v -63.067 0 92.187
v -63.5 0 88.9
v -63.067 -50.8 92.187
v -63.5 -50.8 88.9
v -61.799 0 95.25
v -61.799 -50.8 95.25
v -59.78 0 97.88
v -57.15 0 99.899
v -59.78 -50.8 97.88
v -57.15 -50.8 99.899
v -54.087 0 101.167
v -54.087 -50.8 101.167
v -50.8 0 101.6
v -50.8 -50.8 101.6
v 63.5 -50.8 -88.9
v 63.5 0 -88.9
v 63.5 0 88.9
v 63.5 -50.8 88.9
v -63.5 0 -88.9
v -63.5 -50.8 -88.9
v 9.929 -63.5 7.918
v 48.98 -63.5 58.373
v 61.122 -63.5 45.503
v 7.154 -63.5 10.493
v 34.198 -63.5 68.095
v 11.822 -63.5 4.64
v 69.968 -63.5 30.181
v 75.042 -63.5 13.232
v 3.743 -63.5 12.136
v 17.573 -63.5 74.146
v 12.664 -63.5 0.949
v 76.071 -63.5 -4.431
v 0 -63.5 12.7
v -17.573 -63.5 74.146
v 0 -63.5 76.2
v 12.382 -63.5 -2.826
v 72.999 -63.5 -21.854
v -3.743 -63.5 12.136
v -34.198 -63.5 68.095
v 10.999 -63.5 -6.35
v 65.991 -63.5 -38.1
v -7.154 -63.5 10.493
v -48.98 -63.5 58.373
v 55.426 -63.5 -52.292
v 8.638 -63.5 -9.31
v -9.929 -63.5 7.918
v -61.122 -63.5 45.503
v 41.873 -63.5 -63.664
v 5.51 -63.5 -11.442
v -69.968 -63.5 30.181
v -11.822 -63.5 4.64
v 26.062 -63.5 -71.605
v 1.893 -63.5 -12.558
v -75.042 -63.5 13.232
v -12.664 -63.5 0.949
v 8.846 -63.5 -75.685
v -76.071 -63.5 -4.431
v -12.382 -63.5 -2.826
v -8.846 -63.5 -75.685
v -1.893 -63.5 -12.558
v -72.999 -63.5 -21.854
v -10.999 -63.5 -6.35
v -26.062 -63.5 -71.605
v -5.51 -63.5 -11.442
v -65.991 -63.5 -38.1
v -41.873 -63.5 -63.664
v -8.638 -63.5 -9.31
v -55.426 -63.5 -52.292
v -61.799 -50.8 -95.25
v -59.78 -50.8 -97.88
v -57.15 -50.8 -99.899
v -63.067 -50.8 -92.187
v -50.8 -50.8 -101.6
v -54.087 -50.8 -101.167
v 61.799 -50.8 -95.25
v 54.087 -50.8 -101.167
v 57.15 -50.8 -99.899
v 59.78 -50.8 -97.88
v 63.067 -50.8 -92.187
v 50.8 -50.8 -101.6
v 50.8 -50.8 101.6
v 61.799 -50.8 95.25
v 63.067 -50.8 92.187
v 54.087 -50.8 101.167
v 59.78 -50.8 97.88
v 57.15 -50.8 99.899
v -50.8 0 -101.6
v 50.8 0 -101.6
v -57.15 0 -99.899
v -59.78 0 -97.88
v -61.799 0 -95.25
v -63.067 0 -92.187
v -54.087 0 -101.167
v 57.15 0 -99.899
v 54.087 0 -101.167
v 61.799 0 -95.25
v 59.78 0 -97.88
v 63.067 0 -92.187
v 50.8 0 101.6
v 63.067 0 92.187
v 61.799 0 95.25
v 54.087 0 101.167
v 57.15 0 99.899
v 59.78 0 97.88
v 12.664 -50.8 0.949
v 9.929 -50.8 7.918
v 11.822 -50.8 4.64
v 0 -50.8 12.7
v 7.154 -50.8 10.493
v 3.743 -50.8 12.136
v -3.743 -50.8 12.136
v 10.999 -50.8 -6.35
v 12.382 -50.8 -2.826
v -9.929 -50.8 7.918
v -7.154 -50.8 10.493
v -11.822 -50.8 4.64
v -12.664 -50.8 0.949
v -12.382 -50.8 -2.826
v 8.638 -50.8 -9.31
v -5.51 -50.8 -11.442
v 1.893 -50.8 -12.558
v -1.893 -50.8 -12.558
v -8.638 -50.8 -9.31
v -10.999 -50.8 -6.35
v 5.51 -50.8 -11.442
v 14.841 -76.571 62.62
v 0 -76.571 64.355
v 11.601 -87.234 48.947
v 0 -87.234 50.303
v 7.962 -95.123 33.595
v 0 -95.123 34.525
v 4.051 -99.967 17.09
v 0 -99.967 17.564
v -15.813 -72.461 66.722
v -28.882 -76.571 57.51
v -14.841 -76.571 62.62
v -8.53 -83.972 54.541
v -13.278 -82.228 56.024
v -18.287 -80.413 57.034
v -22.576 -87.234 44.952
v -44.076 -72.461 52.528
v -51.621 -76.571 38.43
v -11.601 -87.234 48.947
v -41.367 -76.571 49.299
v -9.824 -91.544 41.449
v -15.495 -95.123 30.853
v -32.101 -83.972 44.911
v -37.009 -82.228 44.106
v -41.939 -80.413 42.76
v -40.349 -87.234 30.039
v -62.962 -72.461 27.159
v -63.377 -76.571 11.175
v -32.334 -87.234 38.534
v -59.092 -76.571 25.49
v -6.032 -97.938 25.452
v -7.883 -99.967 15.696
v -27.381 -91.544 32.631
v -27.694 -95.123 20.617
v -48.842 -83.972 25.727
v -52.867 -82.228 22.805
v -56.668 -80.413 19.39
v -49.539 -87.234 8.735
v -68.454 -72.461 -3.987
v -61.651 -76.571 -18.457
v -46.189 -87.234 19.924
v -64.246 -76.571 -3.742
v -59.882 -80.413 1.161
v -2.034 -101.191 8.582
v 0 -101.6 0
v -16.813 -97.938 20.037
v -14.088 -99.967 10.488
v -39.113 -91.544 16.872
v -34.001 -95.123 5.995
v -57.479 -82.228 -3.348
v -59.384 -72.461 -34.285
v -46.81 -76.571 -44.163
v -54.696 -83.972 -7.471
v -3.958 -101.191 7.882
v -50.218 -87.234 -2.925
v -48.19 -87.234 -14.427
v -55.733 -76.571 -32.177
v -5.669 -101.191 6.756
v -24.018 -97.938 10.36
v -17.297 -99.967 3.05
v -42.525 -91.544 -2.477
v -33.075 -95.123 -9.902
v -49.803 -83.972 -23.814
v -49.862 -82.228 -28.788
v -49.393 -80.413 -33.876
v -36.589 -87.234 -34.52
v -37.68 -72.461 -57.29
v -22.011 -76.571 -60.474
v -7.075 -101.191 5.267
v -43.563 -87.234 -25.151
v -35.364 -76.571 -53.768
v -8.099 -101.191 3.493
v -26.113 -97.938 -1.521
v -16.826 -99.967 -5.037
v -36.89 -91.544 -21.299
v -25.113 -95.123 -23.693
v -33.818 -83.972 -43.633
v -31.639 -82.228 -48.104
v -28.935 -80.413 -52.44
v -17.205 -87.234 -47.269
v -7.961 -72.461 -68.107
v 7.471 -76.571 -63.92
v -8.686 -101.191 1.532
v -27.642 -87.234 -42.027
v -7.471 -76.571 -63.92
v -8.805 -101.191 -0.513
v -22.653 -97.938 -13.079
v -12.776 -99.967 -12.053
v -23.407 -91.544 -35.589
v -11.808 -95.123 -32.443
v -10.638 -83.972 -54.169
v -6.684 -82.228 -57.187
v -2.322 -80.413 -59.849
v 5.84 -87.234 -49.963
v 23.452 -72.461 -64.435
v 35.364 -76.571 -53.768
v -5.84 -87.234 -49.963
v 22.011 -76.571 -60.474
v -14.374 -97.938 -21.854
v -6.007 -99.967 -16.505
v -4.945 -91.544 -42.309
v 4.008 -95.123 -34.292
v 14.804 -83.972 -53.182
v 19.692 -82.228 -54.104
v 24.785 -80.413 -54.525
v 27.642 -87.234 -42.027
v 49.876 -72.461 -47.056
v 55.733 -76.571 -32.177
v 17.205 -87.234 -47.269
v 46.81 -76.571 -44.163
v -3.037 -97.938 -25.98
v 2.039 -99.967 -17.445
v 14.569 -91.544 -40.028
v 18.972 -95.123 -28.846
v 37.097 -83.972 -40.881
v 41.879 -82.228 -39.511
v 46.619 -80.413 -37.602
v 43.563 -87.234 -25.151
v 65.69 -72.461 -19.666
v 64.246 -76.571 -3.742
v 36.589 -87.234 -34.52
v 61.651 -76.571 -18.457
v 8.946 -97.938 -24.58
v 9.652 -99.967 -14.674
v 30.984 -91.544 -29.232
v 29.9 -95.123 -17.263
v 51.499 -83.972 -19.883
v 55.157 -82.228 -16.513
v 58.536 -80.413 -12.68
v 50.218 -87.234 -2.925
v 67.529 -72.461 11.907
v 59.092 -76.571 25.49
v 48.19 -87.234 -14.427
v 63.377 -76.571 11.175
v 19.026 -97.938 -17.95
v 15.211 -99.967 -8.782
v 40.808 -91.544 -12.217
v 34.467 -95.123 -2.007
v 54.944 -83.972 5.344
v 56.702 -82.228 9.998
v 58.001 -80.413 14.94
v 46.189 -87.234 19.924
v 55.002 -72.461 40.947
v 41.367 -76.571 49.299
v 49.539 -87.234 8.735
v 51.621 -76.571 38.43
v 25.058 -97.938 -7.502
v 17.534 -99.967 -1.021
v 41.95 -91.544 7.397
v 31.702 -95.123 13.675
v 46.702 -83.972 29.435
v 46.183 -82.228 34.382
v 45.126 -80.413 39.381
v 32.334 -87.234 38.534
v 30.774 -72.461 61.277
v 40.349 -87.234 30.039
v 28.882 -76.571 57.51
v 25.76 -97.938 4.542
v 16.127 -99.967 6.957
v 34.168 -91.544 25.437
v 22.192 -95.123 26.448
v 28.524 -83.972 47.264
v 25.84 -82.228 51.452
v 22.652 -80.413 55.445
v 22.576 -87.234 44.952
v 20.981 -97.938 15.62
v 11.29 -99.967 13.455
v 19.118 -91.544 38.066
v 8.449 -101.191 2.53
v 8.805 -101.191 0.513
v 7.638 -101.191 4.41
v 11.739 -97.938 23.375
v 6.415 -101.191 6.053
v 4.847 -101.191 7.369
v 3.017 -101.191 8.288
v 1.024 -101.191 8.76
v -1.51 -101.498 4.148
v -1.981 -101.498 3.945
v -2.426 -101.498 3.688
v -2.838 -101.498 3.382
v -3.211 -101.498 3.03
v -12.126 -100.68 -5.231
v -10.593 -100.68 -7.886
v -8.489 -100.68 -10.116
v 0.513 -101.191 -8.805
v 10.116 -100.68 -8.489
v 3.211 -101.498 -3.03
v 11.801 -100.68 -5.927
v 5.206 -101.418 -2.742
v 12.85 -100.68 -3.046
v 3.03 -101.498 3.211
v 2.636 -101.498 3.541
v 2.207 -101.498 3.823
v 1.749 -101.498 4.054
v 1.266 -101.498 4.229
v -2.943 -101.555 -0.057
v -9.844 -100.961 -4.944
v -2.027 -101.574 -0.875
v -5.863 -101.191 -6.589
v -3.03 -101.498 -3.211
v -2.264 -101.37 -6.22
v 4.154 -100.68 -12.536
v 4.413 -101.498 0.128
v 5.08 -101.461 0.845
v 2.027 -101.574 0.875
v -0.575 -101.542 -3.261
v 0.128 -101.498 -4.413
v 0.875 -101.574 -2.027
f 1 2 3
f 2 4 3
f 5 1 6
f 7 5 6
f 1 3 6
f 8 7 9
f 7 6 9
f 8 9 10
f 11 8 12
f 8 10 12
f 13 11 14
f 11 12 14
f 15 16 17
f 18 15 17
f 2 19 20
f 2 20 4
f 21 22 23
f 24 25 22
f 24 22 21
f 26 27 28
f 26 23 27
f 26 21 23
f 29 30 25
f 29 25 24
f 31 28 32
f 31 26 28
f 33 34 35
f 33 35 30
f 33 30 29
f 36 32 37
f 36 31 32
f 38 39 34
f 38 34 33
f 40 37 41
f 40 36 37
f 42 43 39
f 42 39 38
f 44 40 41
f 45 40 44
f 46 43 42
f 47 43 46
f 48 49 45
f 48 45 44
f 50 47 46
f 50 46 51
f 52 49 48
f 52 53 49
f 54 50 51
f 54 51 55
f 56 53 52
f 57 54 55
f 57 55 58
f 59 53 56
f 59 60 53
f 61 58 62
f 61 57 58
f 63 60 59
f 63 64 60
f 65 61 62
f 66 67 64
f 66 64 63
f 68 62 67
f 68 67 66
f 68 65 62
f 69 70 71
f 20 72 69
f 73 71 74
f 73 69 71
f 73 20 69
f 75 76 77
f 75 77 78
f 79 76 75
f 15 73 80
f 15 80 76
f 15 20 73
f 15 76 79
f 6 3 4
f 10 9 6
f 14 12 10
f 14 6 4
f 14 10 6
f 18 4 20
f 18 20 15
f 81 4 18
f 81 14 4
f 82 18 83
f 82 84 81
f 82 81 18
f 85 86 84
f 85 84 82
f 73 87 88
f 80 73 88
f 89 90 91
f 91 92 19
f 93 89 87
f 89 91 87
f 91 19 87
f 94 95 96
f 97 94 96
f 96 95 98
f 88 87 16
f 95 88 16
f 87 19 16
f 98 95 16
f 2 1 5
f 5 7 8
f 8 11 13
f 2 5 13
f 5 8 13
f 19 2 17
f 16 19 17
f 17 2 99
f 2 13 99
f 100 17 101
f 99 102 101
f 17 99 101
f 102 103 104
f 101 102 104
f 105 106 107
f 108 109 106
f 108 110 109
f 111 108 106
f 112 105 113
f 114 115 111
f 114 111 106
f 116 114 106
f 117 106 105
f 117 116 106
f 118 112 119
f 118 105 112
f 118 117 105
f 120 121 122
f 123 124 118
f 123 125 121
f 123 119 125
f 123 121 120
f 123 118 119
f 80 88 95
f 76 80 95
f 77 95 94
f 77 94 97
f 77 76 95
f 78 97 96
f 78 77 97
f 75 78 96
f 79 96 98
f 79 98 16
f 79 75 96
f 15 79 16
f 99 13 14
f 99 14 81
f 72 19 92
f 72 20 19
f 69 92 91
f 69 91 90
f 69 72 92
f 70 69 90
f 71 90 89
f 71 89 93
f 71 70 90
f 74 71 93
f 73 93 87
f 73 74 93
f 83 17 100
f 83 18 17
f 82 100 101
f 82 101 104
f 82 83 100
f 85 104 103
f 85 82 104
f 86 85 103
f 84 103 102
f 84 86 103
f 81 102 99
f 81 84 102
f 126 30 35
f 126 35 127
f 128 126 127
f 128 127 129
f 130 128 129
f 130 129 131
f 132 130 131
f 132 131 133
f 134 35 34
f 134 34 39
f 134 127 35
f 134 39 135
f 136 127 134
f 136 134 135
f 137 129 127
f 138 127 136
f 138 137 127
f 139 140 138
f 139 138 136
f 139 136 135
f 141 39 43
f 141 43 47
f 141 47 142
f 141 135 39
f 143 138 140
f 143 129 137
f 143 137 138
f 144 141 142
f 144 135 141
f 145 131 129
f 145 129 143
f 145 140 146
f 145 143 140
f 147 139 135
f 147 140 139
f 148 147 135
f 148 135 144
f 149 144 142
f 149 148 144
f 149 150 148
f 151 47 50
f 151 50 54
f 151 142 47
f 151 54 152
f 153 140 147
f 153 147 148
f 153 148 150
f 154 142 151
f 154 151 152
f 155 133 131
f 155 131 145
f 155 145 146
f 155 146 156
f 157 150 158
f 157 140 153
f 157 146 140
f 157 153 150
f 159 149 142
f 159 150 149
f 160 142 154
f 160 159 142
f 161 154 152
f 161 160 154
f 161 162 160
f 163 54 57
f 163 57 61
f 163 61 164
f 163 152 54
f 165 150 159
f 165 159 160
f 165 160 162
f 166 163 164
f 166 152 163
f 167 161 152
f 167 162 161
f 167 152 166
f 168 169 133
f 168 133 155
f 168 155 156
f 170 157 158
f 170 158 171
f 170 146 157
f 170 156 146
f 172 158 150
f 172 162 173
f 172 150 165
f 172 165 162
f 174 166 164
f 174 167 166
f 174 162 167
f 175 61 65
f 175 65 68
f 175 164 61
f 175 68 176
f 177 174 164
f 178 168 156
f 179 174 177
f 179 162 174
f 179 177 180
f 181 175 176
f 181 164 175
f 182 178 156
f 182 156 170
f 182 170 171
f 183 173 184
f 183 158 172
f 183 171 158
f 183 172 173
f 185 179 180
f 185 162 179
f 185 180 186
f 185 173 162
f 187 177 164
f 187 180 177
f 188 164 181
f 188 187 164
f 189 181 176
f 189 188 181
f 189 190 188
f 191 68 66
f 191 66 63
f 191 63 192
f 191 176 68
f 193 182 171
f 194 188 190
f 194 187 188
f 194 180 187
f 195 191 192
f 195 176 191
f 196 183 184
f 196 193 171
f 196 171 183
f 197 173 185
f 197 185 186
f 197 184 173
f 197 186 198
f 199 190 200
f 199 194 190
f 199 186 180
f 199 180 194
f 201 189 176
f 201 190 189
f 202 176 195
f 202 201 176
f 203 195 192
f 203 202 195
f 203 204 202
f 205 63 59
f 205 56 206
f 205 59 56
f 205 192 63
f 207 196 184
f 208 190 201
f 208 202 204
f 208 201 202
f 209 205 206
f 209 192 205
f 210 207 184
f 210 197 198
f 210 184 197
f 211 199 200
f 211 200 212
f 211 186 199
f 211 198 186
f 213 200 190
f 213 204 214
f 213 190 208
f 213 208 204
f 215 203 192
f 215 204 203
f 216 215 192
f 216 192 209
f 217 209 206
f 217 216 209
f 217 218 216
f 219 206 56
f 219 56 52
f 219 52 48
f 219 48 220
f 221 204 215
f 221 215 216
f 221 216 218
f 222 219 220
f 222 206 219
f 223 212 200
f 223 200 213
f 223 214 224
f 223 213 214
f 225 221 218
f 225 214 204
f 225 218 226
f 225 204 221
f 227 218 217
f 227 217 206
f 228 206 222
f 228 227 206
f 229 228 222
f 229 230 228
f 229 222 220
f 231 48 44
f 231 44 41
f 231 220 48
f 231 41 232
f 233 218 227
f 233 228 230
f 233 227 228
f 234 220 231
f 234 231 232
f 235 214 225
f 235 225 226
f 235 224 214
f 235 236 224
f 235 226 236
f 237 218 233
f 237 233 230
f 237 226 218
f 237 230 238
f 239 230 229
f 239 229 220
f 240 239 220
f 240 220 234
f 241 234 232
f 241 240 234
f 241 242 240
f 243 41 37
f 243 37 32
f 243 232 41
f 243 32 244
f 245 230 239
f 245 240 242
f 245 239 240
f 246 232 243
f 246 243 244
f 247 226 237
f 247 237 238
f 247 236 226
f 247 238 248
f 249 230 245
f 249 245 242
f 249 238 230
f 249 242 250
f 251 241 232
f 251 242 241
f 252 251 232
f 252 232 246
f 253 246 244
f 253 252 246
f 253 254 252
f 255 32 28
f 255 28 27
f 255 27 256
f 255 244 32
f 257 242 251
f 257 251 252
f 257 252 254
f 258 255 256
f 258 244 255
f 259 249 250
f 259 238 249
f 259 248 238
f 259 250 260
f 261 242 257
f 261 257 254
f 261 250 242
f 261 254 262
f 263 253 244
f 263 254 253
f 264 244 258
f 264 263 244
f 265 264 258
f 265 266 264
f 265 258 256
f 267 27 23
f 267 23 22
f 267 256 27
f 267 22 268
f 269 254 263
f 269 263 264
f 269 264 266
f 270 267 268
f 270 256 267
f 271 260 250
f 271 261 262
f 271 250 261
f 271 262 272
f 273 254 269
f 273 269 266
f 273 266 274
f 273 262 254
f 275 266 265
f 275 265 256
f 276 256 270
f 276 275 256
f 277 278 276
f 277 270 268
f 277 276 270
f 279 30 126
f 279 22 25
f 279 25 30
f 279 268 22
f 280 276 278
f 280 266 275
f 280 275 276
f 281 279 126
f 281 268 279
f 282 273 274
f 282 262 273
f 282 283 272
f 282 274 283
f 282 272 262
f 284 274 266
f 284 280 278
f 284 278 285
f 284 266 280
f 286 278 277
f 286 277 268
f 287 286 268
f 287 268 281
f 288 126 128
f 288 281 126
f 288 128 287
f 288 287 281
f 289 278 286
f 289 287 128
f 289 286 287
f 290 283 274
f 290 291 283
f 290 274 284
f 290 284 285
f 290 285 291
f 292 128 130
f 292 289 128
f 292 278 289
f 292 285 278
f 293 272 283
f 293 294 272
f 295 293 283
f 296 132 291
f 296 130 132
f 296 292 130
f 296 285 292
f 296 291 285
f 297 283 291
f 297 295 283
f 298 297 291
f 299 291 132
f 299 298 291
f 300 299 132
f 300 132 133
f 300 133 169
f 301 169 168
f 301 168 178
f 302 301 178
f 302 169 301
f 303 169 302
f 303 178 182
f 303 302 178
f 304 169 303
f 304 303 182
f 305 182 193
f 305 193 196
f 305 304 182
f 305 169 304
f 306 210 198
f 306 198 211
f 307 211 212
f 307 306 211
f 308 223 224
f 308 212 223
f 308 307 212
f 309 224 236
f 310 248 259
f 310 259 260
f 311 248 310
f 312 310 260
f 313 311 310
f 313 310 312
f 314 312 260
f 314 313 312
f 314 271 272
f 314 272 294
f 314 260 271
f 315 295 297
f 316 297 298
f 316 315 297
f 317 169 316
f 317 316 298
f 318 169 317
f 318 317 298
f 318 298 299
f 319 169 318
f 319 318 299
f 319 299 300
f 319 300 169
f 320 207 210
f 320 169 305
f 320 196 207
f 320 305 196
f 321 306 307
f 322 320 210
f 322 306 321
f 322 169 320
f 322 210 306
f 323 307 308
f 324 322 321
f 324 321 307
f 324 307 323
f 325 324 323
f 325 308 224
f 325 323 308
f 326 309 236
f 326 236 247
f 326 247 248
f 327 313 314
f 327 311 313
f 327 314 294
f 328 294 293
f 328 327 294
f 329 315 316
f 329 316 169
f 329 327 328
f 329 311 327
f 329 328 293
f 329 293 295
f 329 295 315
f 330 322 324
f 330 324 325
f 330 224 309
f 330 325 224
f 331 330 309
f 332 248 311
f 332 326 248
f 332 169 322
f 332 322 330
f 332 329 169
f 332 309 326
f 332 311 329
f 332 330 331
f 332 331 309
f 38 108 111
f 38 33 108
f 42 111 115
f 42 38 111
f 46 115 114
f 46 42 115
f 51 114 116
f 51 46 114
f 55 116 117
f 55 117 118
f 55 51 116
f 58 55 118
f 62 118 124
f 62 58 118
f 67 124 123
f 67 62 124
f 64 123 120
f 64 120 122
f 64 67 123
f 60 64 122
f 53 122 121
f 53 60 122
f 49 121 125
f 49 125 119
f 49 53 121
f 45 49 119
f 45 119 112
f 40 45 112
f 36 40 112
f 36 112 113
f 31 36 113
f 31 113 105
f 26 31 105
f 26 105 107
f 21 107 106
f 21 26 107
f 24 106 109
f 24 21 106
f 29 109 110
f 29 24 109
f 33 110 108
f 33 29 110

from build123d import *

# Parameters (mm, degrees)
F0_W     = 127
F0_H     = 203.2
F1_DEPTH = 50.8
F4_R     = 12.7


with BuildPart() as f1:
    # F0 (on Front) → F1 (new body)
    with BuildSketch(Plane.XZ):
        Rectangle(F0_W, F0_H)
    extrude(amount=F1_DEPTH)

    # F4
    f4_edges = [f1.edges().sort_by_distance(p)[0] for p in [
        (63.5, -25.4, 101.6),
        (-63.5, -25.4, 101.6),
        (63.5, -25.4, -101.6),
        (-63.5, -25.4, -101.6),
    ]]
    fillet(f4_edges, radius=F4_R)


with BuildPart() as f3:
    # F2 (on Right) → F3 (revolve)
    with BuildSketch(Plane.YZ):
        with BuildLine():
            Line((-50.8, 0), (-50.8, 12.7))
            Line((-50.8, 12.7), (-63.5, 12.7))
            Line((-63.5, 12.7), (-63.5, 76.2))
            ThreePointArc((-63.5, 76.2), (-91.54419, 42.597095), (-101.6, 0))
            Line((-101.6, 0), (-50.8, 0))
        make_face()
    revolve(axis=Axis((0, -76.2, 0), (0, -1, 0)))


solid = Compound([f1.part, f3.part])
